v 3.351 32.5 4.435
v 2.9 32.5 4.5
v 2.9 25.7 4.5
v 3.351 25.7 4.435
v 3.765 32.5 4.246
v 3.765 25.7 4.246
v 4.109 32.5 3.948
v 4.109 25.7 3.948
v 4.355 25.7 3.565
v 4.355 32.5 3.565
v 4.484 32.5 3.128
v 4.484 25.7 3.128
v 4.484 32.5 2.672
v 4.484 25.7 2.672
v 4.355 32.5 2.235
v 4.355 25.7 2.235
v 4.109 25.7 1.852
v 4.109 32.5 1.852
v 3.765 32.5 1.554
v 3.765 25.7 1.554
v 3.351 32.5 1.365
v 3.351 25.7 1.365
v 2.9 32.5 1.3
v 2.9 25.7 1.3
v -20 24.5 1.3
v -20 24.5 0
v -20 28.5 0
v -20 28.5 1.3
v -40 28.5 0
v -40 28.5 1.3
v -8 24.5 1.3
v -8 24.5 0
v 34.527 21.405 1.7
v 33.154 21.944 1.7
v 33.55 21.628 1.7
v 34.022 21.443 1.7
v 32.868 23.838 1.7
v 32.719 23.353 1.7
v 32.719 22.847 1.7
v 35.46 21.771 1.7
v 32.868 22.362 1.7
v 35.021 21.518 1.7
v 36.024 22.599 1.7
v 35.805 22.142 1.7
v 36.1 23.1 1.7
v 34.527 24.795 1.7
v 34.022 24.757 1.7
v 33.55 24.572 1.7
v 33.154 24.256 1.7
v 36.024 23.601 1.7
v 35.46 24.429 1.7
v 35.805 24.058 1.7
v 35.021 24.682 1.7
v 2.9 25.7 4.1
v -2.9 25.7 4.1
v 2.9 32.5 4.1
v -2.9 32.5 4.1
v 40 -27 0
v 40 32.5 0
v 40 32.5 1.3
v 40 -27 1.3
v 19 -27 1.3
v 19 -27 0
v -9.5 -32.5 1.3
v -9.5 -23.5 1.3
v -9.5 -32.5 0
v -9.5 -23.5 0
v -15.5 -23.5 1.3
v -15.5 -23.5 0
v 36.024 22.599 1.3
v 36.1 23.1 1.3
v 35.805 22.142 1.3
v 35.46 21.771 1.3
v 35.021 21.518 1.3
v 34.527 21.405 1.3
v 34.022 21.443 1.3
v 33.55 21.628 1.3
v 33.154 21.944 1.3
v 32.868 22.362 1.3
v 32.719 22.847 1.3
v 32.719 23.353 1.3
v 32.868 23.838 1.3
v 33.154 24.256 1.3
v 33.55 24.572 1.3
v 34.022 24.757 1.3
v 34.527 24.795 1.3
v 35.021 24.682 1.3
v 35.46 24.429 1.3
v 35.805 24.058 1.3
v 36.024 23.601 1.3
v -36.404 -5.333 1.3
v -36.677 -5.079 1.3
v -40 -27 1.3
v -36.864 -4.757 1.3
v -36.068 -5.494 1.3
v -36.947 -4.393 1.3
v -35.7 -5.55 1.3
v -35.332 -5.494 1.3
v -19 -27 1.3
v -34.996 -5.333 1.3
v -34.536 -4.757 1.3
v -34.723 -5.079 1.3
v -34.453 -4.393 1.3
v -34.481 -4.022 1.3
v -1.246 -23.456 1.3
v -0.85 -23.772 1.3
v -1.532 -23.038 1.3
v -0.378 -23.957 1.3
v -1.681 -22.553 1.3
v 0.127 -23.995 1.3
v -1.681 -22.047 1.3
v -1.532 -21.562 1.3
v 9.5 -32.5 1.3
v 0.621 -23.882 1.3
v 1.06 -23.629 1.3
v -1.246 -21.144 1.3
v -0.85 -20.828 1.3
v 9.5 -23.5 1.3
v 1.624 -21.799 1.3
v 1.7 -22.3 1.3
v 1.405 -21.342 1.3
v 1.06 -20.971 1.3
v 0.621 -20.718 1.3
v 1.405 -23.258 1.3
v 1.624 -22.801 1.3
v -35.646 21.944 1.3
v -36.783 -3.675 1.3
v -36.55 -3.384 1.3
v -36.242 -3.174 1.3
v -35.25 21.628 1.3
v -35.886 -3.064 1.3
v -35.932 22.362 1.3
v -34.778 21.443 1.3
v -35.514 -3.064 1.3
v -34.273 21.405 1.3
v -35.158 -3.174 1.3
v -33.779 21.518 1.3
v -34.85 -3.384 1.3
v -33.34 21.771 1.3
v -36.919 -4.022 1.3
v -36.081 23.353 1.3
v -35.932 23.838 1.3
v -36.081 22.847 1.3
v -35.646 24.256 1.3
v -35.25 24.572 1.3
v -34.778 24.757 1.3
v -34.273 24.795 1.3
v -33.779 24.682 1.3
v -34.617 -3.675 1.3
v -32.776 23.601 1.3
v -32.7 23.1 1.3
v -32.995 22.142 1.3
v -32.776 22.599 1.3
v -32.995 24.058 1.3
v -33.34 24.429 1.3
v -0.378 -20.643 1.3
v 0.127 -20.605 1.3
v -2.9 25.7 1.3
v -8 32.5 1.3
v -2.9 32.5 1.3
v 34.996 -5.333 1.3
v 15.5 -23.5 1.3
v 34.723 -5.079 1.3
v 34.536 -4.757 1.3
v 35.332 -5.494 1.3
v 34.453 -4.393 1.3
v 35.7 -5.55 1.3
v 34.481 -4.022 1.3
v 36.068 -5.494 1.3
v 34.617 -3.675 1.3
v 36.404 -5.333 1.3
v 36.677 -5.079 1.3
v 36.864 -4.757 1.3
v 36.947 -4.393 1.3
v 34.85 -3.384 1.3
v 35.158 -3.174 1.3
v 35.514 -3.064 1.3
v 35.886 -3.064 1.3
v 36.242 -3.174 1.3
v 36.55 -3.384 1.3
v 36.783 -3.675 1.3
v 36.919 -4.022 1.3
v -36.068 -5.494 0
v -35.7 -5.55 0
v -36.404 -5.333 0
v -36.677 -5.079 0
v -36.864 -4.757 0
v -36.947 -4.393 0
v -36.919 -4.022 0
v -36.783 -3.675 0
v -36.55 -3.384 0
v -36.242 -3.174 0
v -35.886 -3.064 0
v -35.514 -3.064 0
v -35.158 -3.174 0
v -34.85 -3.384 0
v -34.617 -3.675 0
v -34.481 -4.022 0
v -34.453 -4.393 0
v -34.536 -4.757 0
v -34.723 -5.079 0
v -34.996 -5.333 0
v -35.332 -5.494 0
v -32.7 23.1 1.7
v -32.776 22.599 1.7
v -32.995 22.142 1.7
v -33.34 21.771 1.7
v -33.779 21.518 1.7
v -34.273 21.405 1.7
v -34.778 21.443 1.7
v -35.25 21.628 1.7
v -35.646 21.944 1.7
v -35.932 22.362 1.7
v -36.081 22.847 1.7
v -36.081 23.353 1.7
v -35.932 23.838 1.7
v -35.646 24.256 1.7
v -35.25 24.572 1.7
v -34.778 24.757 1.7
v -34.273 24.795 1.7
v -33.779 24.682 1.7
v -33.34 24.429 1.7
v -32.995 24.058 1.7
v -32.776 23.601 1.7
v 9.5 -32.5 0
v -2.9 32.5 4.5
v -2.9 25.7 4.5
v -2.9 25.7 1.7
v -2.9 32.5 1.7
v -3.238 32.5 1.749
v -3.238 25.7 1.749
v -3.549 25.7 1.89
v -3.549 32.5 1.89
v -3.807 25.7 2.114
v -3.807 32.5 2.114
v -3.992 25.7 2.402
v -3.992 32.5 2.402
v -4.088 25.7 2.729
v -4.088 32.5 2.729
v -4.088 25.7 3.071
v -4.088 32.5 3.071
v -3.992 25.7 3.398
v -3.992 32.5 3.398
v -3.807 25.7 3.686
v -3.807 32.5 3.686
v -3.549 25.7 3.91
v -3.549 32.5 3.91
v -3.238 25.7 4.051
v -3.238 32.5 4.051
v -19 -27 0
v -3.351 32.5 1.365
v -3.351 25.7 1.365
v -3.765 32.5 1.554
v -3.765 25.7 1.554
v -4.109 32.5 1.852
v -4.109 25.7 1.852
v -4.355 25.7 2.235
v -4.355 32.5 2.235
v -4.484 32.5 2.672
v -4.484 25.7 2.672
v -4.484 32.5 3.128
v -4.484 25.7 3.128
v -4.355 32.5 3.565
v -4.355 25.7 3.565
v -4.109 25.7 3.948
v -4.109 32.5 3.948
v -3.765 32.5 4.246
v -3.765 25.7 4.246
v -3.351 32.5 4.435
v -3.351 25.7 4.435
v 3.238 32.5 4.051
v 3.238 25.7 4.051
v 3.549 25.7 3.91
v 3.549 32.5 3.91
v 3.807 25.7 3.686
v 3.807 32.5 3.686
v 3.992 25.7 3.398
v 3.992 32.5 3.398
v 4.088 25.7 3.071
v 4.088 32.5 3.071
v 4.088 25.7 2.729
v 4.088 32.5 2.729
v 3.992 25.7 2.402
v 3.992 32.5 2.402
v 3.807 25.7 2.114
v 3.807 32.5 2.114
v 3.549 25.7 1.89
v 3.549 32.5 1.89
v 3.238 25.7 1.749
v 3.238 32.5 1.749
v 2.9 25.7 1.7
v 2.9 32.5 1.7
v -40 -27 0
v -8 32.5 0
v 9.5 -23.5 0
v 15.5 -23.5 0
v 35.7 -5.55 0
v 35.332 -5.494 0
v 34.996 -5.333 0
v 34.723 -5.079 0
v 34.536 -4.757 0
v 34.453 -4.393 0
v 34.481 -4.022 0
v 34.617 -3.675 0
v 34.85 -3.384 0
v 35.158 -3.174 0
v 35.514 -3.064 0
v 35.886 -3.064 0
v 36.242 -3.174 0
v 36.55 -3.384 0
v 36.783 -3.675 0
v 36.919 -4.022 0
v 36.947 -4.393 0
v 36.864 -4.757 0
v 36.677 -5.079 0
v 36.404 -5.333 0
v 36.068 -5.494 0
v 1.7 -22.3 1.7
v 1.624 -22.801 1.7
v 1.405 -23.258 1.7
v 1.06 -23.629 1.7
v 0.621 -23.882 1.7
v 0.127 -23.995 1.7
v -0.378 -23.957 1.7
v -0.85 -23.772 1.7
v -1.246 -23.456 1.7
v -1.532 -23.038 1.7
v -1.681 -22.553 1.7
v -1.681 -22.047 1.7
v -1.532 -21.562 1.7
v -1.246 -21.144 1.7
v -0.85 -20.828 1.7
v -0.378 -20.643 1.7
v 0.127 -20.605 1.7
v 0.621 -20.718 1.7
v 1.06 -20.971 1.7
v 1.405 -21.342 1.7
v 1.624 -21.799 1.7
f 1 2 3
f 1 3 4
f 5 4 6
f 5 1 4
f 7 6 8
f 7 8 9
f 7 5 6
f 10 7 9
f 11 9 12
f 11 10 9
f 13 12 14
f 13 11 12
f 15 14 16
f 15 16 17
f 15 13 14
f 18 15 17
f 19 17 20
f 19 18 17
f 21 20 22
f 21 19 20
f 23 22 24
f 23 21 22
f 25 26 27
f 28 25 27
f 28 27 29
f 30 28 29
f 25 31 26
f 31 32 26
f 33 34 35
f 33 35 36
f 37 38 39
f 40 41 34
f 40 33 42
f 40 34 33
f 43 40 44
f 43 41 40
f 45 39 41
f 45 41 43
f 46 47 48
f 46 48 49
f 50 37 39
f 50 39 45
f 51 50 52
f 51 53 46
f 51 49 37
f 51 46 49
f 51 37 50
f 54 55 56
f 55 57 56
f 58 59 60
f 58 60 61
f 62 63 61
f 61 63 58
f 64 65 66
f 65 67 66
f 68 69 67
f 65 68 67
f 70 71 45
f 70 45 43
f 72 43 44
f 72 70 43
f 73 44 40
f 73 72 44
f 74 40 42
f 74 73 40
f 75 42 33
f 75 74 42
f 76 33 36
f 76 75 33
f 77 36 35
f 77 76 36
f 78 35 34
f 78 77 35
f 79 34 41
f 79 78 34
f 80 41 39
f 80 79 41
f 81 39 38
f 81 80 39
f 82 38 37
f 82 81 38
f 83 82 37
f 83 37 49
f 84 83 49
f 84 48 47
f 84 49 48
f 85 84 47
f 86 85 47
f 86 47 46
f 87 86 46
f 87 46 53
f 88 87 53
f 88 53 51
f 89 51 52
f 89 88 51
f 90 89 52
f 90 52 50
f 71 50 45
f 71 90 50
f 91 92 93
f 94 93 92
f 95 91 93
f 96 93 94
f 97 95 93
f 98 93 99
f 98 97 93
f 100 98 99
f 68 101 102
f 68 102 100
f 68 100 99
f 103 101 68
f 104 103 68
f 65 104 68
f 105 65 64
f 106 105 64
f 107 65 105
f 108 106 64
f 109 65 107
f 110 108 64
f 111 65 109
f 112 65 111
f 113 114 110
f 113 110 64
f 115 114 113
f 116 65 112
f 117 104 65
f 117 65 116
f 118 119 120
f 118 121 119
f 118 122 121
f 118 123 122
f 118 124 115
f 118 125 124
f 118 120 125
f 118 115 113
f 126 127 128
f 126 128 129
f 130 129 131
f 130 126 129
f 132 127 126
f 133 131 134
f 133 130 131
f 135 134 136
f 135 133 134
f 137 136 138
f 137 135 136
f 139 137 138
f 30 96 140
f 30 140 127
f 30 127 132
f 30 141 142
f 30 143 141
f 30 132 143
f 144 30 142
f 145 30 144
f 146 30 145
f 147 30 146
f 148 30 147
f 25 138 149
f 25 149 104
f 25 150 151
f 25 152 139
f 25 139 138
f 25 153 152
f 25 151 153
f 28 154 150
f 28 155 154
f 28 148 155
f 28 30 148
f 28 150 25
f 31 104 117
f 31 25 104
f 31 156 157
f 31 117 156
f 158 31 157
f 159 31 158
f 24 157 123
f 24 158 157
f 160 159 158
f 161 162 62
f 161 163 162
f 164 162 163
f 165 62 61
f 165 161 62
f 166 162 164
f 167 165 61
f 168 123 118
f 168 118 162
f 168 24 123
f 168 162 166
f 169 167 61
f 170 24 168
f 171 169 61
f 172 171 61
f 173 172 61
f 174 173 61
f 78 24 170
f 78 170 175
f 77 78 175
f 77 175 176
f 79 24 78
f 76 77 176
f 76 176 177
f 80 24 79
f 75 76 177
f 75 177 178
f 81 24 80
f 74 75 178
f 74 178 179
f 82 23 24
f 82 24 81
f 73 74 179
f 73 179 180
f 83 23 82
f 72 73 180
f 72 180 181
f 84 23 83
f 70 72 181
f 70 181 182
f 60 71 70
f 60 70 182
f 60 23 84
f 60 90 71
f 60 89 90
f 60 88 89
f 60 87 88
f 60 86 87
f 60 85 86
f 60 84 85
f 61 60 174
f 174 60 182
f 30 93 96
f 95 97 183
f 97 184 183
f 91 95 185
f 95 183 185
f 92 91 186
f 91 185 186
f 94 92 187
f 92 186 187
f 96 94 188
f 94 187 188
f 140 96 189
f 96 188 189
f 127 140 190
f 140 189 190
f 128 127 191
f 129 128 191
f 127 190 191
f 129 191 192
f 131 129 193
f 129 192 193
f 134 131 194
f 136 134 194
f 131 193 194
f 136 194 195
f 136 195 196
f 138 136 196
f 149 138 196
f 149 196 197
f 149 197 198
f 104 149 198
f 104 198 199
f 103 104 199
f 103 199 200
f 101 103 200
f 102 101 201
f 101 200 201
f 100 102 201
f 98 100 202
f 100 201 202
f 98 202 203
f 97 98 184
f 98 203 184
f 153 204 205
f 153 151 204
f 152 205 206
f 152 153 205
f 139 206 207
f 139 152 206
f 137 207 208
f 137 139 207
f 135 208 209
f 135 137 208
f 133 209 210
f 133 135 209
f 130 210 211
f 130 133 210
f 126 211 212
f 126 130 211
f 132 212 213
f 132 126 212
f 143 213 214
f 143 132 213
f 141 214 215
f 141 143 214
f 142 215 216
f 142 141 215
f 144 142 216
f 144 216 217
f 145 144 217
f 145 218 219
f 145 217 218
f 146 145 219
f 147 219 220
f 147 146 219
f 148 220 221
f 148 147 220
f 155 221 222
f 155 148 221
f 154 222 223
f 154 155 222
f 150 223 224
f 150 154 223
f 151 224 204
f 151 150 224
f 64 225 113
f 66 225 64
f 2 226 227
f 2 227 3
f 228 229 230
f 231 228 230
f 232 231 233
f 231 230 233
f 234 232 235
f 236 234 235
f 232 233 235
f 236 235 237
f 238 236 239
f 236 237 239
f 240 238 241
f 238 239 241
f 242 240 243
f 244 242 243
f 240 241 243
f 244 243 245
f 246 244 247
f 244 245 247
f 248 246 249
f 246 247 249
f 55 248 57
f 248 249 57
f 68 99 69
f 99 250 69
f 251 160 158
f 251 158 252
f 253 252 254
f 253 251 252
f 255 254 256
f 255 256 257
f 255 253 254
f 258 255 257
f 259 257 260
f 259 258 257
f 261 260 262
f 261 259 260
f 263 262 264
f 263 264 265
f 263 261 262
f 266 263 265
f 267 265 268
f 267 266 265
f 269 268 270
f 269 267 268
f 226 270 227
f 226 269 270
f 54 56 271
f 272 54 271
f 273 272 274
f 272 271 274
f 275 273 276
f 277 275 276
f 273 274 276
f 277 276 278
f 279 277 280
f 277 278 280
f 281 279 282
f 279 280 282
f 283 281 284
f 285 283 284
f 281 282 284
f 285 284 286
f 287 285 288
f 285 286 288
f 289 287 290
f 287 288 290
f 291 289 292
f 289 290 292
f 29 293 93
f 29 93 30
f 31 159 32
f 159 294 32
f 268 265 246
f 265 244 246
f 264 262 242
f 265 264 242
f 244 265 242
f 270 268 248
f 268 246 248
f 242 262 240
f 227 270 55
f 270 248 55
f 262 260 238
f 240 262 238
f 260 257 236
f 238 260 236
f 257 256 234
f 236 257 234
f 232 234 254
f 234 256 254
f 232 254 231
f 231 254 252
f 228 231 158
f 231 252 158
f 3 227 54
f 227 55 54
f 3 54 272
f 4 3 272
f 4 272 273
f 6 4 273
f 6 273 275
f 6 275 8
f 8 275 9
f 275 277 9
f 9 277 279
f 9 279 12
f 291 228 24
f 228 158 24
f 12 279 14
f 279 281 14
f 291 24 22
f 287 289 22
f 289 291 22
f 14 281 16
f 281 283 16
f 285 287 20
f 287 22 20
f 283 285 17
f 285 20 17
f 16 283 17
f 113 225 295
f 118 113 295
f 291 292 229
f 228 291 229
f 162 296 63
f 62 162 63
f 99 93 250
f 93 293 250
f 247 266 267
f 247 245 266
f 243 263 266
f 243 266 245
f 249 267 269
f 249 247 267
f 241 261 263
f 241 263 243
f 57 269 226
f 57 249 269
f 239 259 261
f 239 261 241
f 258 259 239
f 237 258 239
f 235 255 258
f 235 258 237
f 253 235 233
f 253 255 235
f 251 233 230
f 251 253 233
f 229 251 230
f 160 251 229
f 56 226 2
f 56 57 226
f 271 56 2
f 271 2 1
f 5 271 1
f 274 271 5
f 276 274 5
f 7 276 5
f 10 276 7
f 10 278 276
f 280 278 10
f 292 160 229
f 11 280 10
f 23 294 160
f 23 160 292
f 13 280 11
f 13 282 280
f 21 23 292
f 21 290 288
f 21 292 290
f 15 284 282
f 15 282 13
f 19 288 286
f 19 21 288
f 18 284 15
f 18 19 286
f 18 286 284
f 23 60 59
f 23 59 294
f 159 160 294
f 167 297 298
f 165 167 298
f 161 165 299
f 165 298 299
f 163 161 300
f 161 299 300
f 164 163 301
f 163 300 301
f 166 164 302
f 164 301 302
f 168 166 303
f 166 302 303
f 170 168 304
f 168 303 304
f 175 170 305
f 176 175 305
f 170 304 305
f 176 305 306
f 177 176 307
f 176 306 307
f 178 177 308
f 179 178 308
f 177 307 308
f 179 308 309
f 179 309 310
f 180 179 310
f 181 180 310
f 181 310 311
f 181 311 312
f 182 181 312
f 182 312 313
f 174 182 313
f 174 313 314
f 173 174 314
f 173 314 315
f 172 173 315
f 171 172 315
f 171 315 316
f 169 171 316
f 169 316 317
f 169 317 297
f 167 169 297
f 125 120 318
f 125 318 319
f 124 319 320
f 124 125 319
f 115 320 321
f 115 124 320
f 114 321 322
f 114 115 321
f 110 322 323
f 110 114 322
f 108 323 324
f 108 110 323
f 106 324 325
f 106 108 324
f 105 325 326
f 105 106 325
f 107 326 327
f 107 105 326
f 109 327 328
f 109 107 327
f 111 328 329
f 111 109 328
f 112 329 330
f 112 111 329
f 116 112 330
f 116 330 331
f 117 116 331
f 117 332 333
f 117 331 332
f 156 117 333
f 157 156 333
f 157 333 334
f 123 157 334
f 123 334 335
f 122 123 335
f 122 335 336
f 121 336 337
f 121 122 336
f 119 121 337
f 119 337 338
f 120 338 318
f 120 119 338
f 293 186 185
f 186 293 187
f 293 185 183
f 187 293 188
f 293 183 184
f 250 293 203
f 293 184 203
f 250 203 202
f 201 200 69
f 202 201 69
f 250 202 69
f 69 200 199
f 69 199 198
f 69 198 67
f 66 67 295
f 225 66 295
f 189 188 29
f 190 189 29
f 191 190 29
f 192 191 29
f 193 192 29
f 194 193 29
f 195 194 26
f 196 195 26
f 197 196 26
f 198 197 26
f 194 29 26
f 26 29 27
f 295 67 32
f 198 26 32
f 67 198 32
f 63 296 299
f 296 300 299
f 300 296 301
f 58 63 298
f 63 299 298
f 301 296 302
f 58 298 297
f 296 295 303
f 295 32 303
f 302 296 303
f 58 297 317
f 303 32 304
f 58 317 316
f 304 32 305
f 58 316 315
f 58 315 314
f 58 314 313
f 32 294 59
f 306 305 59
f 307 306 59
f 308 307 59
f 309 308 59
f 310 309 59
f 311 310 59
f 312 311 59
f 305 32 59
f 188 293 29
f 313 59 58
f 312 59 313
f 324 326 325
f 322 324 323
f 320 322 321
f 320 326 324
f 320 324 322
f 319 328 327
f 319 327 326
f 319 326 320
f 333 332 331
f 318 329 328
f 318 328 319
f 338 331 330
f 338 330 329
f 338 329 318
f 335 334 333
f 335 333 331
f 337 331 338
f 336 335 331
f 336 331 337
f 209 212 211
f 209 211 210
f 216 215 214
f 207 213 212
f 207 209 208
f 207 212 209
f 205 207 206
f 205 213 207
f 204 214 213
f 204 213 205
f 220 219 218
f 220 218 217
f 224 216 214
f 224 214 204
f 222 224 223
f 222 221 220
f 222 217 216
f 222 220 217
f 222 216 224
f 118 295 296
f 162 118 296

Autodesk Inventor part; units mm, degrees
ref_plane "YZ Plane" through (0, 0, 0) normal (1, 0, 0) x (0, 1, 0)
ref_plane "XZ Plane" through (0, 0, 0) normal (0, 1, 0) x (-1, 0, 0)
ref_plane "XY Plane" through (0, 0, 0) normal (0, 0, 1) x (1, 0, 0)
sketch "Sketch1" plane through (0, 0, 0) normal (0, 0, 1) x (1, 0, 0)
  line L0 (-40, 32.5) -> (40, 32.5)
  line L1 (40, 32.5) -> (40, -32.5)
  line L2 (40, -32.5) -> (-40, -32.5)
  line L3 (-40, -32.5) -> (-40, 32.5)
  line L4 (-40, 32.5) -> (40, -32.5) construction
  line L5 (40, 32.5) -> (-40, -32.5) construction
  line L6 (-8, 32.5) -> (-8, 24.5)
  line L7 (-8, 24.5) -> (-20, 24.5)
  line L8 (-20, 24.5) -> (-20, 28.5)
  line L9 (-20, 28.5) -> (-40, 28.5)
  line L10 (-40, -27) -> (-19, -27)
  line L11 (-19, -27) -> (-15.5, -23.5)
  line L12 (-15.5, -23.5) -> (-9.5, -23.5)
  line L13 (-9.5, -23.5) -> (-9.5, -32.5)
  line L14 (9.5, -32.5) -> (9.5, -23.5)
  line L15 (9.5, -23.5) -> (15.5, -23.5)
  line L16 (15.5, -23.5) -> (19, -27)
  line L17 (19, -27) -> (40, -27)
  point P0 (0, 0)
  dimension "d0" = 80
  dimension "d1" = 65
  dimension "d2" = 19
  dimension "d3" = 45
  dimension "d4" = 9
  dimension "d5" = 3.5
  dimension "d6" = 6
  dimension "d7" = 45
  dimension "d8" = 8
  dimension "d9" = 8
  dimension "d10" = 12
  dimension "d11" = 4
extrude "Extrusion1" add sketch "Sketch1" along normal blind 1.3 contours L0 L1 L17 L16 L15 L14 L2 L13 L12 L11 L10 L3 L9 L8 L7 L6
sketch "Sketch2" plane through (0, 0, 1.3) normal (0, 0, 1) x (1, 0, 0)
  line L0 (-35.7, -4.3) -> (35.7, -4.3) construction
  line L1 (-40, -27) -> (-19, -27) projected
  point P0 (0, 0)
  point P1 (0, -4.3)
  dimension "d14" = 71.4
  dimension "d15" = 22.7
hole "Hole1" at (-35.7, -4.3, 1.3) at (35.7, -4.3, 1.3) direction (0, 0, -1) diameter 2.5 end through all
sketch "Sketch4" plane through (-8, 32.5, 0) normal (0, 1, 0) x (1, 0, 0)
  line L0 (10.9, -2.9) -> (5.1, -2.9) construction
  line L1 (10.9, -1.3) -> (5.1, -1.3)
  line L2 (5.1, -4.5) -> (10.9, -4.5)
  arc A0 (10.9, -4.5) -> (10.9, -1.3) centre (10.9, -2.9) ccw
  arc A1 (5.1, -1.3) -> (5.1, -4.5) centre (5.1, -2.9) ccw
  line L3 (48, -1.3) -> (0, -1.3) projected
  line L4 (10.9, -2.9) -> (5.1, -2.9) construction
  line L5 (10.9, -1.7) -> (5.1, -1.7)
  line L6 (5.1, -4.1) -> (10.9, -4.1)
  arc A2 (10.9, -4.1) -> (10.9, -1.7) centre (10.9, -2.9) ccw
  arc A3 (5.1, -1.7) -> (5.1, -4.1) centre (5.1, -2.9) ccw
  point P0 (8, 0)
  point P1 (8, -2.9)
  point P2 (3.5, -2.9)
  point P3 (12.5, -2.9)
  point P4 (8, -2.9)
  dimension "d23" = 3.2
  dimension "d24" = 9
  dimension "d25" = 0.4
extrude "Extrusion2" add sketch "Sketch4" against normal blind 6.8
sketch "Sketch5" plane through (0, 0, 1.3) normal (0, 0, 1) x (1, 0, 0)
  circle A0 centre (-34.4, 23.1) radius 1.7
  circle A1 centre (34.4, 23.1) radius 1.7
  circle A2 centre (0, -22.3) radius 1.7
  line L0 (-34.4, 23.1) -> (34.4, 23.1) construction
  circle A3 centre (35.7, -4.3) radius 1.25 projected
  point P0 (0, 0)
  point P1 (0, 23.1)
  dimension "d28" = 3.4
  dimension "d29" = 68.8
  dimension "d30" = 27.4
  dimension "d31" = 18
extrude "Extrusion3" add sketch "Sketch5" along normal blind 0.4 contours A0 | A1 | A2
equation "\"d7\" = d3"
properties part number "BDM-030"
